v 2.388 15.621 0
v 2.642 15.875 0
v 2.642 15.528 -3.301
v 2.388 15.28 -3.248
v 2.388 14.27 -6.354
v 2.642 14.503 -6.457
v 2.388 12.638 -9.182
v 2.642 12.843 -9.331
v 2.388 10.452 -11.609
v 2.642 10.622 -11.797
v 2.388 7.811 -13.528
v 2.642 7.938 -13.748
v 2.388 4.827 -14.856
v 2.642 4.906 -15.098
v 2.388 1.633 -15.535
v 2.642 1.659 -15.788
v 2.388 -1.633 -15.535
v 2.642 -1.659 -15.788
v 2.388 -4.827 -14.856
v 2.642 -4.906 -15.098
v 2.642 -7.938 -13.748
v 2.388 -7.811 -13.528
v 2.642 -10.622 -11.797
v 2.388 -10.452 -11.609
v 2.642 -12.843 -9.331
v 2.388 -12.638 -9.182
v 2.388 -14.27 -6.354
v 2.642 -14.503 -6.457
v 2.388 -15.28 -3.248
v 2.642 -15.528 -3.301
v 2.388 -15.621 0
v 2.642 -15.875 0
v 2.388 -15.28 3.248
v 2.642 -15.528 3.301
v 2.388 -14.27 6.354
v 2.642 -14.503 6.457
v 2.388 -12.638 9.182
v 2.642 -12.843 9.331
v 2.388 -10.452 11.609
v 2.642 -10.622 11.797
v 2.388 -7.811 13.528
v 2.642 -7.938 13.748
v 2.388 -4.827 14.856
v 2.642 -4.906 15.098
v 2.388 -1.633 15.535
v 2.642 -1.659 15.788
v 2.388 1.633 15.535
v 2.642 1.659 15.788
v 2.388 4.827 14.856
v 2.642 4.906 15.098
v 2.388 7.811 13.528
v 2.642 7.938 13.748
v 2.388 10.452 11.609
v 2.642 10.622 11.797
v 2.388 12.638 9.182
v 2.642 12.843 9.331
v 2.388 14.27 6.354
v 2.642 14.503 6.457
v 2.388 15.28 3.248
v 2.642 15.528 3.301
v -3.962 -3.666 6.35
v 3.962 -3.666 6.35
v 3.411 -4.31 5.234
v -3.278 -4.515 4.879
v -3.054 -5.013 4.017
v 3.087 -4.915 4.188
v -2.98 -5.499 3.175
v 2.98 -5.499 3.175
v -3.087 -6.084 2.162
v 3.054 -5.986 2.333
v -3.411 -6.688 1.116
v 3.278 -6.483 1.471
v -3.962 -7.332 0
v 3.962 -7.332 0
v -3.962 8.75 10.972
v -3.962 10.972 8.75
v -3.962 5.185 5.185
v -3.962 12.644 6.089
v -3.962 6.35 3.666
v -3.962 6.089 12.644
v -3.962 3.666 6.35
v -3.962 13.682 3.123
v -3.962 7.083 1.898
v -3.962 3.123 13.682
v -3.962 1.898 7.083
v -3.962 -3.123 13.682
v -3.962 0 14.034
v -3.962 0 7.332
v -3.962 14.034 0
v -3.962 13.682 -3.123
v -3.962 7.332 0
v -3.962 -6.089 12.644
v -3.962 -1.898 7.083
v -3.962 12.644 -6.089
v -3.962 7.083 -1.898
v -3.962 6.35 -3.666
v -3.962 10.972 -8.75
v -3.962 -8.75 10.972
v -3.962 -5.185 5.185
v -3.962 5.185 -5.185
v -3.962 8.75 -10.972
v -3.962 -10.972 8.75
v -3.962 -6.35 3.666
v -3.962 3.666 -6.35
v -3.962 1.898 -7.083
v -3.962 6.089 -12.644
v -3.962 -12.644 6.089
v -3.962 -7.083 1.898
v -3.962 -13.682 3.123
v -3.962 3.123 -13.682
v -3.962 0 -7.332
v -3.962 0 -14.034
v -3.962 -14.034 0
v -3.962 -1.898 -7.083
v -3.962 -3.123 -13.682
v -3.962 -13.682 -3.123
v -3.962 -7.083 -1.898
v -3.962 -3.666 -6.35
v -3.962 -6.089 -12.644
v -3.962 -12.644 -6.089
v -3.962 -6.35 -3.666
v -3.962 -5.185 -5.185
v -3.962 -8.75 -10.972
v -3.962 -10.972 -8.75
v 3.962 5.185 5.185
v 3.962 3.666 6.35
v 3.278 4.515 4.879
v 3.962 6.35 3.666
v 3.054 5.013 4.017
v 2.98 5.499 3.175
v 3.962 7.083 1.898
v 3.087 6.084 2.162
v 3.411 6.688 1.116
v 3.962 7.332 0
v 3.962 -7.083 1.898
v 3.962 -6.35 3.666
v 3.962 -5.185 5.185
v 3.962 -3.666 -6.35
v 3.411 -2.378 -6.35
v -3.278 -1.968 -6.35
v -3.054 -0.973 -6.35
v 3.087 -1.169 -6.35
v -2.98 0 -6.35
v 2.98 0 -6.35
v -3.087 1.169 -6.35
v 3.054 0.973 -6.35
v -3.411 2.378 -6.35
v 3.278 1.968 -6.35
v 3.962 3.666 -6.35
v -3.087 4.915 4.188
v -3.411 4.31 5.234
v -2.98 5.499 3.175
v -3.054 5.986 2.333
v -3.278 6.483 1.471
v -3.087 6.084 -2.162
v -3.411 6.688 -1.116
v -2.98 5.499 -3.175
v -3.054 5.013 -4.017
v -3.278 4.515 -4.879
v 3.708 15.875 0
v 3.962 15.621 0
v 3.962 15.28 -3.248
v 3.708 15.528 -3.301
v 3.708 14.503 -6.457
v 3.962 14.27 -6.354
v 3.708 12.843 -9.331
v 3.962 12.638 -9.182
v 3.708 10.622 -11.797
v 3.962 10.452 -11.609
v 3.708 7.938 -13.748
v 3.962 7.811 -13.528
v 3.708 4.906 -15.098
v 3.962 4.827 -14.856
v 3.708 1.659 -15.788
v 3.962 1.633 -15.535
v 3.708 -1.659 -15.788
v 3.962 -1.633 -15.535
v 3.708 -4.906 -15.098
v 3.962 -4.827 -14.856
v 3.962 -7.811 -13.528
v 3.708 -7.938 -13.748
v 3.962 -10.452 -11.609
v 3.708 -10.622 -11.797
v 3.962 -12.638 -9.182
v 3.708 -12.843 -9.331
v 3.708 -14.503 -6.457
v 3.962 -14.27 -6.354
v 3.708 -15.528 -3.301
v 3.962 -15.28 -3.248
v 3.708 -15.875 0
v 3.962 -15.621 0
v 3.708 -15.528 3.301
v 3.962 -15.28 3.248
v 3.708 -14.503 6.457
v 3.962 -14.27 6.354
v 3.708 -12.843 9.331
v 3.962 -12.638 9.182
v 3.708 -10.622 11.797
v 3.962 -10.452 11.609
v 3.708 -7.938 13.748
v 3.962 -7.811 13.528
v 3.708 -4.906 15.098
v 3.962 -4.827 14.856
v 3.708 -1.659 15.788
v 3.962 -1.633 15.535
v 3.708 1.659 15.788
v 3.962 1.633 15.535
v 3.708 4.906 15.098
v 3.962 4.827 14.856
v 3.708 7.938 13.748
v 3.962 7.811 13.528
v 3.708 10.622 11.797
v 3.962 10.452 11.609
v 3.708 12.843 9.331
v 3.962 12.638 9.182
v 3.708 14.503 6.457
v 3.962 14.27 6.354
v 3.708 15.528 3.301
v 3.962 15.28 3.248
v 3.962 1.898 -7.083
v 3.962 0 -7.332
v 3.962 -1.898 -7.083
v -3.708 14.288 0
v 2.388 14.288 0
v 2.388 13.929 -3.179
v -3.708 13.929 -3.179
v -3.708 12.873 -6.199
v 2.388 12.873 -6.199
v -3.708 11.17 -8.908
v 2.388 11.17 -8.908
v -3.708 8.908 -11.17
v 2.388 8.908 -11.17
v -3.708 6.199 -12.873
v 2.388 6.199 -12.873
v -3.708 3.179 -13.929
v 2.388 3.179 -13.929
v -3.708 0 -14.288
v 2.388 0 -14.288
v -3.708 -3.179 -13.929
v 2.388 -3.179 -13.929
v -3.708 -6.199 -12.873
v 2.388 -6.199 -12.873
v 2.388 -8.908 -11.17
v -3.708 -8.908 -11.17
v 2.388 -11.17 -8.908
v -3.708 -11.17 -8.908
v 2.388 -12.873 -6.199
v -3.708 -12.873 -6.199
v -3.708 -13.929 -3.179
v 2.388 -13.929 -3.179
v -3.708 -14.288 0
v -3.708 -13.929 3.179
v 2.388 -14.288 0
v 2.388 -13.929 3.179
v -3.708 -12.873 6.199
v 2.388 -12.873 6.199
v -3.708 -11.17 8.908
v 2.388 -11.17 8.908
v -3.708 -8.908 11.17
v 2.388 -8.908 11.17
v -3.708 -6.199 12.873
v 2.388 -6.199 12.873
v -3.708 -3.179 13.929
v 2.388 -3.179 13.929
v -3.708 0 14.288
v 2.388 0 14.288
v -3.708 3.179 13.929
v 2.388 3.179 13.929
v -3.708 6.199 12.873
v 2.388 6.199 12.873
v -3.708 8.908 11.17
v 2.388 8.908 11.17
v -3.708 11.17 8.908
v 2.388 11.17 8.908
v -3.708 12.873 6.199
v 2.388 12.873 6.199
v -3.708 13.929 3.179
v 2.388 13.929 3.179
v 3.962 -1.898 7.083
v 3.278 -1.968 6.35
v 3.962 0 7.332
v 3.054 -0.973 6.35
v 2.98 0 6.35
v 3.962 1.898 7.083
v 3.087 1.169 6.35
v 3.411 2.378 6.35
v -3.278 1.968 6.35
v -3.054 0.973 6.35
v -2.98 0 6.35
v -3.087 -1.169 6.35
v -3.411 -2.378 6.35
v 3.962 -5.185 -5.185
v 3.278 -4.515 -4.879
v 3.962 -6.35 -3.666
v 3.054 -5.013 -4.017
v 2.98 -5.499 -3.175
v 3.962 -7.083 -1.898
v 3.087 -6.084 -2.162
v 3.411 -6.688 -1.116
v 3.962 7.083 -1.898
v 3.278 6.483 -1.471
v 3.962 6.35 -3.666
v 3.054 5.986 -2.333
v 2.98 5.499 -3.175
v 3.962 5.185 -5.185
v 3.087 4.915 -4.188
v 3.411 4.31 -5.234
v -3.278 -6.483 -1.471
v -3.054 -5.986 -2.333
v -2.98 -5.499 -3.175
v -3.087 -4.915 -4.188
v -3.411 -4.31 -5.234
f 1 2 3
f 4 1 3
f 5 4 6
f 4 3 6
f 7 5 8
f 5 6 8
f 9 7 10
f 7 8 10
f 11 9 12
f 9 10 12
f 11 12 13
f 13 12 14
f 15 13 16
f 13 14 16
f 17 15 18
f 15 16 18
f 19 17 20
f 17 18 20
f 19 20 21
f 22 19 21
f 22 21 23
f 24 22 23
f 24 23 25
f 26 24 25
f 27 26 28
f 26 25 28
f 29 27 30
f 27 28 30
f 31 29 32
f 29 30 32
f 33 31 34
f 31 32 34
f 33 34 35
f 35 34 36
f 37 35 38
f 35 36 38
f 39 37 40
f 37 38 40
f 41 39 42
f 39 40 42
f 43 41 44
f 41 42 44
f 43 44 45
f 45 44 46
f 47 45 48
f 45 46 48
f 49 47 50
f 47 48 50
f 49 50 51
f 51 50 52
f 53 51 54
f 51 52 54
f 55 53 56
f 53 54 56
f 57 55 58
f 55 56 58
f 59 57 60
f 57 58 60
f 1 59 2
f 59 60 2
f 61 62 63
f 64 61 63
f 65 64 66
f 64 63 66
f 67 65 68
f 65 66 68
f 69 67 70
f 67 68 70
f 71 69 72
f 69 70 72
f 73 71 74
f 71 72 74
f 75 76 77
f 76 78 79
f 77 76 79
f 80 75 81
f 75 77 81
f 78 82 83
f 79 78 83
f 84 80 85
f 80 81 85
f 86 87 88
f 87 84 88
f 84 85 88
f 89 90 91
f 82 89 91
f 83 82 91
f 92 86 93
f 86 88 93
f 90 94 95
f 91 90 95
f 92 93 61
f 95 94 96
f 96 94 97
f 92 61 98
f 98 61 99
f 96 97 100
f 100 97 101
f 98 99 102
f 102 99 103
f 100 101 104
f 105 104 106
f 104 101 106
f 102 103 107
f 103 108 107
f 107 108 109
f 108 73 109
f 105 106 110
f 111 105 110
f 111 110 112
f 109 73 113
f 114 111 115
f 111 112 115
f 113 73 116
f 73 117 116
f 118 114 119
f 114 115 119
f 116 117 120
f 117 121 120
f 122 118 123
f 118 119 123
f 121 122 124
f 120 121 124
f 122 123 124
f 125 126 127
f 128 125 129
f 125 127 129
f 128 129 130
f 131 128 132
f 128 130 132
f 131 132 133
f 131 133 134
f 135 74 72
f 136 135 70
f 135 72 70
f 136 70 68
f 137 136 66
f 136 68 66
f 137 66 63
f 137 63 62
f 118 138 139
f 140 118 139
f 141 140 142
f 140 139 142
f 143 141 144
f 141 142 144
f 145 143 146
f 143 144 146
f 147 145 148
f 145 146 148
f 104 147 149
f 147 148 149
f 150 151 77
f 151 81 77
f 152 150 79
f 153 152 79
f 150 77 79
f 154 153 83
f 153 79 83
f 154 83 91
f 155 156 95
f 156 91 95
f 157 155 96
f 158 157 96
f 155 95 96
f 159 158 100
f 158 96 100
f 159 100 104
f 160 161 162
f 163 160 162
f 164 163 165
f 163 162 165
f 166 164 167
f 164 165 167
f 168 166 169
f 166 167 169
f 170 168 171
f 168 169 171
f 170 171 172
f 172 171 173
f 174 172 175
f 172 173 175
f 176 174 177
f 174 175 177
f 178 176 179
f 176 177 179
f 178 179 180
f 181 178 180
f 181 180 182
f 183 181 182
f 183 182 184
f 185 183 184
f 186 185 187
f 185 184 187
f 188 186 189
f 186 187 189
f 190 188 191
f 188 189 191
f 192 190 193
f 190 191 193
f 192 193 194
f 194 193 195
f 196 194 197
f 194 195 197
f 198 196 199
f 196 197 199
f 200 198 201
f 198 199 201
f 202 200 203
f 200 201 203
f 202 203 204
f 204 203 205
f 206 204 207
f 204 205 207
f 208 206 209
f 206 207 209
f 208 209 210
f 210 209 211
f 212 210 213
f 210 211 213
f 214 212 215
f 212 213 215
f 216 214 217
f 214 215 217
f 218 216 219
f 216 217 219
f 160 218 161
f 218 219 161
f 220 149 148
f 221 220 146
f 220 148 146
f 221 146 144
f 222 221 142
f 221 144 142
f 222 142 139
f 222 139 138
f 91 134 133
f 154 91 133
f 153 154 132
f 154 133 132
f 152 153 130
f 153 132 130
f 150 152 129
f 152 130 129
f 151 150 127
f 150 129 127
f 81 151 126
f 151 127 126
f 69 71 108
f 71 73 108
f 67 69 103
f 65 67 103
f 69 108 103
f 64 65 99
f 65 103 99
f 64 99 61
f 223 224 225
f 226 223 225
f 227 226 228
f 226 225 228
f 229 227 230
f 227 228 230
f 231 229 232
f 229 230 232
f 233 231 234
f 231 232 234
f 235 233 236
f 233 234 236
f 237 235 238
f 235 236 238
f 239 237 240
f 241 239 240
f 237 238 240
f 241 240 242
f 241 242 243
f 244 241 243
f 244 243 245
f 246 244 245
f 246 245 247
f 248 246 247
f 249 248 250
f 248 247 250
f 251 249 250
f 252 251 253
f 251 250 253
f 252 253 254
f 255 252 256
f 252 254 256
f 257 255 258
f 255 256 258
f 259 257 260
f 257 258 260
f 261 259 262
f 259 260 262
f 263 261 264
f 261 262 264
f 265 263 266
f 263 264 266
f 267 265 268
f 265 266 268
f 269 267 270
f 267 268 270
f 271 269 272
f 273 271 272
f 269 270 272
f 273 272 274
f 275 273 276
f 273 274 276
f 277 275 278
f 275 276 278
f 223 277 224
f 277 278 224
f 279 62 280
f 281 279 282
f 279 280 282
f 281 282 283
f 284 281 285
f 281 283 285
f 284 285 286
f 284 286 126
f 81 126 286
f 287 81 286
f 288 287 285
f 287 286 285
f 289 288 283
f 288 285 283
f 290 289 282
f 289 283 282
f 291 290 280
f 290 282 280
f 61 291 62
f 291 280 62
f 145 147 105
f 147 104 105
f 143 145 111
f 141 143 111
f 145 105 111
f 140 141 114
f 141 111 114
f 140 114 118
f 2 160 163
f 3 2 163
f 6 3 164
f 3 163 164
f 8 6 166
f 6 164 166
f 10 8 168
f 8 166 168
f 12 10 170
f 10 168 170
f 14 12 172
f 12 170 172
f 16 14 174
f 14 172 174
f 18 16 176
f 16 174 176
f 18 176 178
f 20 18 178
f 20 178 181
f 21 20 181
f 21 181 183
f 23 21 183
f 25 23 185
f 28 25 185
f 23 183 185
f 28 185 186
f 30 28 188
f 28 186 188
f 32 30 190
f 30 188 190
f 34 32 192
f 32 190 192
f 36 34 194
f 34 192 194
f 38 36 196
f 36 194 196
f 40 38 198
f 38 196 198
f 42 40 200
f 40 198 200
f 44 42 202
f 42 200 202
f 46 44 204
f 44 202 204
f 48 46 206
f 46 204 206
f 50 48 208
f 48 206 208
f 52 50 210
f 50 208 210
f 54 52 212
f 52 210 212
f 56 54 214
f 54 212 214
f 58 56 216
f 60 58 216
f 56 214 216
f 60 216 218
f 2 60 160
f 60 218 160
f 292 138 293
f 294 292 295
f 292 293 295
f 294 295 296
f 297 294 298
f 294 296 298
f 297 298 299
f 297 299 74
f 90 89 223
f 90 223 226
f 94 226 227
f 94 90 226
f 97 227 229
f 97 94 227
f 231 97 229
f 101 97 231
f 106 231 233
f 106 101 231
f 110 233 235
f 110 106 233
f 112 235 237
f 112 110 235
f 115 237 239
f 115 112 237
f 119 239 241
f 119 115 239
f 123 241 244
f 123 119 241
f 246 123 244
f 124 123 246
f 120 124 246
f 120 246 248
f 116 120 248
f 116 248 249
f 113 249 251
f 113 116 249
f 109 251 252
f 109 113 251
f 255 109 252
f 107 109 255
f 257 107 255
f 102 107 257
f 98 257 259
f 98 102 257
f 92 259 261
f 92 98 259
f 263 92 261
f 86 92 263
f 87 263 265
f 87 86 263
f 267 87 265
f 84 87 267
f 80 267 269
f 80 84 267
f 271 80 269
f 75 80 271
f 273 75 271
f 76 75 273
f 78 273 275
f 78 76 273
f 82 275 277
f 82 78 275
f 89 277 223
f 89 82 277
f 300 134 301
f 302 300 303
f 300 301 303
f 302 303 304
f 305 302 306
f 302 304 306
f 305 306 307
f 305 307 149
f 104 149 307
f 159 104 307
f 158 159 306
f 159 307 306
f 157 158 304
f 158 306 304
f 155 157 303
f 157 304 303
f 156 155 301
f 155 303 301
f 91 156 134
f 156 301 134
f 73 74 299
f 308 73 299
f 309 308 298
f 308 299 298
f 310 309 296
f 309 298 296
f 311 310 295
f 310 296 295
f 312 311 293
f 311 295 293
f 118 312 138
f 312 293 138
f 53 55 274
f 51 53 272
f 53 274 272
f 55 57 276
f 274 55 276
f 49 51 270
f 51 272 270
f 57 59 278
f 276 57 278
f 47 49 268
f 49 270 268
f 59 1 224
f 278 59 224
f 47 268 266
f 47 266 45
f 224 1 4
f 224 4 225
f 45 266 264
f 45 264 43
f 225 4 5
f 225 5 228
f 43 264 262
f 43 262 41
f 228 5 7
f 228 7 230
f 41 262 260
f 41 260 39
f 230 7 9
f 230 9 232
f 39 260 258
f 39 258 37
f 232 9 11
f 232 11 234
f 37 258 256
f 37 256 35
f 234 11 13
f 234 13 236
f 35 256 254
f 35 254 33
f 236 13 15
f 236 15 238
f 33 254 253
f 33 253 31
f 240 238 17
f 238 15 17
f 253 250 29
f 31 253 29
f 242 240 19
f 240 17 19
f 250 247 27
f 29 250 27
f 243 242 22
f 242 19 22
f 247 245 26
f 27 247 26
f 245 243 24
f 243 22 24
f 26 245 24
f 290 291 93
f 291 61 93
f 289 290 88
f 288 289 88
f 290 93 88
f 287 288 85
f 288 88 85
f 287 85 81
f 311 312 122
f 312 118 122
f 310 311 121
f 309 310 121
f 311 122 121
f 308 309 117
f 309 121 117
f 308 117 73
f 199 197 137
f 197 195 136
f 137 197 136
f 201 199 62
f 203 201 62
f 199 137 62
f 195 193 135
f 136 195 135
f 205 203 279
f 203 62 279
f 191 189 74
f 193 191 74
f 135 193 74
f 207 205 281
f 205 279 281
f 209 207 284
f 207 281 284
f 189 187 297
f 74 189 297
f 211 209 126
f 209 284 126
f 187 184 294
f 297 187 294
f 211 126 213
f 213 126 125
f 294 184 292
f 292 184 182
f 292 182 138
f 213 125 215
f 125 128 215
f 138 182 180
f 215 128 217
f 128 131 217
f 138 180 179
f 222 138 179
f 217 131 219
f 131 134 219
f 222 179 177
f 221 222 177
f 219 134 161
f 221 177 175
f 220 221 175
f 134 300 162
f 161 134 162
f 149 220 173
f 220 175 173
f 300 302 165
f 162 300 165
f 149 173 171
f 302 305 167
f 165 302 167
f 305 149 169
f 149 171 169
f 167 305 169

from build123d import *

# Parameters (mm, degrees)
CUT_EXTRUDE1_DEPTH = 8.9248
CHAMFER1_SIZE      = 0.254


with BuildPart() as part:
    # Sketch1 → Revolve1 (revolve)
    with BuildSketch(Plane.XY):
        Polygon((-3.9624, 14.2875), (2.3876, 14.2875), (2.3876, 15.875), (3.9624, 15.875), (3.9624, 7.332348419), (2.980051581, 6.35), (-2.980051581, 6.35), (-3.9624, 7.332348419), align=None)
    revolve(axis=Axis((3.9624, 0, 0), (-1, 0, 0)))

    # Sketch2 → Cut-Extrude1 (cut, through all)
    with BuildSketch(Plane(origin=(3.9624, 0, 0), x_dir=(0, 0, -1), z_dir=(1, 0, 0))):
        Polygon((0, 7.332348419), (-6.35, 3.666174209), (-6.35, -3.666174209), (0, -7.332348419), (6.35, -3.666174209), (6.35, 3.666174209), align=None)
    extrude(amount=-CUT_EXTRUDE1_DEPTH, mode=Mode.SUBTRACT)

    # Chamfer1
    chamfer1_edges = [part.edges().sort_by_distance(p)[0] for p in [
        (3.9624, -15.875, 0),
        (2.3876, -15.875, 0),
        (-3.9624, -14.2875, 0),
    ]]
    chamfer(chamfer1_edges, length=CHAMFER1_SIZE)


solid = part.part
